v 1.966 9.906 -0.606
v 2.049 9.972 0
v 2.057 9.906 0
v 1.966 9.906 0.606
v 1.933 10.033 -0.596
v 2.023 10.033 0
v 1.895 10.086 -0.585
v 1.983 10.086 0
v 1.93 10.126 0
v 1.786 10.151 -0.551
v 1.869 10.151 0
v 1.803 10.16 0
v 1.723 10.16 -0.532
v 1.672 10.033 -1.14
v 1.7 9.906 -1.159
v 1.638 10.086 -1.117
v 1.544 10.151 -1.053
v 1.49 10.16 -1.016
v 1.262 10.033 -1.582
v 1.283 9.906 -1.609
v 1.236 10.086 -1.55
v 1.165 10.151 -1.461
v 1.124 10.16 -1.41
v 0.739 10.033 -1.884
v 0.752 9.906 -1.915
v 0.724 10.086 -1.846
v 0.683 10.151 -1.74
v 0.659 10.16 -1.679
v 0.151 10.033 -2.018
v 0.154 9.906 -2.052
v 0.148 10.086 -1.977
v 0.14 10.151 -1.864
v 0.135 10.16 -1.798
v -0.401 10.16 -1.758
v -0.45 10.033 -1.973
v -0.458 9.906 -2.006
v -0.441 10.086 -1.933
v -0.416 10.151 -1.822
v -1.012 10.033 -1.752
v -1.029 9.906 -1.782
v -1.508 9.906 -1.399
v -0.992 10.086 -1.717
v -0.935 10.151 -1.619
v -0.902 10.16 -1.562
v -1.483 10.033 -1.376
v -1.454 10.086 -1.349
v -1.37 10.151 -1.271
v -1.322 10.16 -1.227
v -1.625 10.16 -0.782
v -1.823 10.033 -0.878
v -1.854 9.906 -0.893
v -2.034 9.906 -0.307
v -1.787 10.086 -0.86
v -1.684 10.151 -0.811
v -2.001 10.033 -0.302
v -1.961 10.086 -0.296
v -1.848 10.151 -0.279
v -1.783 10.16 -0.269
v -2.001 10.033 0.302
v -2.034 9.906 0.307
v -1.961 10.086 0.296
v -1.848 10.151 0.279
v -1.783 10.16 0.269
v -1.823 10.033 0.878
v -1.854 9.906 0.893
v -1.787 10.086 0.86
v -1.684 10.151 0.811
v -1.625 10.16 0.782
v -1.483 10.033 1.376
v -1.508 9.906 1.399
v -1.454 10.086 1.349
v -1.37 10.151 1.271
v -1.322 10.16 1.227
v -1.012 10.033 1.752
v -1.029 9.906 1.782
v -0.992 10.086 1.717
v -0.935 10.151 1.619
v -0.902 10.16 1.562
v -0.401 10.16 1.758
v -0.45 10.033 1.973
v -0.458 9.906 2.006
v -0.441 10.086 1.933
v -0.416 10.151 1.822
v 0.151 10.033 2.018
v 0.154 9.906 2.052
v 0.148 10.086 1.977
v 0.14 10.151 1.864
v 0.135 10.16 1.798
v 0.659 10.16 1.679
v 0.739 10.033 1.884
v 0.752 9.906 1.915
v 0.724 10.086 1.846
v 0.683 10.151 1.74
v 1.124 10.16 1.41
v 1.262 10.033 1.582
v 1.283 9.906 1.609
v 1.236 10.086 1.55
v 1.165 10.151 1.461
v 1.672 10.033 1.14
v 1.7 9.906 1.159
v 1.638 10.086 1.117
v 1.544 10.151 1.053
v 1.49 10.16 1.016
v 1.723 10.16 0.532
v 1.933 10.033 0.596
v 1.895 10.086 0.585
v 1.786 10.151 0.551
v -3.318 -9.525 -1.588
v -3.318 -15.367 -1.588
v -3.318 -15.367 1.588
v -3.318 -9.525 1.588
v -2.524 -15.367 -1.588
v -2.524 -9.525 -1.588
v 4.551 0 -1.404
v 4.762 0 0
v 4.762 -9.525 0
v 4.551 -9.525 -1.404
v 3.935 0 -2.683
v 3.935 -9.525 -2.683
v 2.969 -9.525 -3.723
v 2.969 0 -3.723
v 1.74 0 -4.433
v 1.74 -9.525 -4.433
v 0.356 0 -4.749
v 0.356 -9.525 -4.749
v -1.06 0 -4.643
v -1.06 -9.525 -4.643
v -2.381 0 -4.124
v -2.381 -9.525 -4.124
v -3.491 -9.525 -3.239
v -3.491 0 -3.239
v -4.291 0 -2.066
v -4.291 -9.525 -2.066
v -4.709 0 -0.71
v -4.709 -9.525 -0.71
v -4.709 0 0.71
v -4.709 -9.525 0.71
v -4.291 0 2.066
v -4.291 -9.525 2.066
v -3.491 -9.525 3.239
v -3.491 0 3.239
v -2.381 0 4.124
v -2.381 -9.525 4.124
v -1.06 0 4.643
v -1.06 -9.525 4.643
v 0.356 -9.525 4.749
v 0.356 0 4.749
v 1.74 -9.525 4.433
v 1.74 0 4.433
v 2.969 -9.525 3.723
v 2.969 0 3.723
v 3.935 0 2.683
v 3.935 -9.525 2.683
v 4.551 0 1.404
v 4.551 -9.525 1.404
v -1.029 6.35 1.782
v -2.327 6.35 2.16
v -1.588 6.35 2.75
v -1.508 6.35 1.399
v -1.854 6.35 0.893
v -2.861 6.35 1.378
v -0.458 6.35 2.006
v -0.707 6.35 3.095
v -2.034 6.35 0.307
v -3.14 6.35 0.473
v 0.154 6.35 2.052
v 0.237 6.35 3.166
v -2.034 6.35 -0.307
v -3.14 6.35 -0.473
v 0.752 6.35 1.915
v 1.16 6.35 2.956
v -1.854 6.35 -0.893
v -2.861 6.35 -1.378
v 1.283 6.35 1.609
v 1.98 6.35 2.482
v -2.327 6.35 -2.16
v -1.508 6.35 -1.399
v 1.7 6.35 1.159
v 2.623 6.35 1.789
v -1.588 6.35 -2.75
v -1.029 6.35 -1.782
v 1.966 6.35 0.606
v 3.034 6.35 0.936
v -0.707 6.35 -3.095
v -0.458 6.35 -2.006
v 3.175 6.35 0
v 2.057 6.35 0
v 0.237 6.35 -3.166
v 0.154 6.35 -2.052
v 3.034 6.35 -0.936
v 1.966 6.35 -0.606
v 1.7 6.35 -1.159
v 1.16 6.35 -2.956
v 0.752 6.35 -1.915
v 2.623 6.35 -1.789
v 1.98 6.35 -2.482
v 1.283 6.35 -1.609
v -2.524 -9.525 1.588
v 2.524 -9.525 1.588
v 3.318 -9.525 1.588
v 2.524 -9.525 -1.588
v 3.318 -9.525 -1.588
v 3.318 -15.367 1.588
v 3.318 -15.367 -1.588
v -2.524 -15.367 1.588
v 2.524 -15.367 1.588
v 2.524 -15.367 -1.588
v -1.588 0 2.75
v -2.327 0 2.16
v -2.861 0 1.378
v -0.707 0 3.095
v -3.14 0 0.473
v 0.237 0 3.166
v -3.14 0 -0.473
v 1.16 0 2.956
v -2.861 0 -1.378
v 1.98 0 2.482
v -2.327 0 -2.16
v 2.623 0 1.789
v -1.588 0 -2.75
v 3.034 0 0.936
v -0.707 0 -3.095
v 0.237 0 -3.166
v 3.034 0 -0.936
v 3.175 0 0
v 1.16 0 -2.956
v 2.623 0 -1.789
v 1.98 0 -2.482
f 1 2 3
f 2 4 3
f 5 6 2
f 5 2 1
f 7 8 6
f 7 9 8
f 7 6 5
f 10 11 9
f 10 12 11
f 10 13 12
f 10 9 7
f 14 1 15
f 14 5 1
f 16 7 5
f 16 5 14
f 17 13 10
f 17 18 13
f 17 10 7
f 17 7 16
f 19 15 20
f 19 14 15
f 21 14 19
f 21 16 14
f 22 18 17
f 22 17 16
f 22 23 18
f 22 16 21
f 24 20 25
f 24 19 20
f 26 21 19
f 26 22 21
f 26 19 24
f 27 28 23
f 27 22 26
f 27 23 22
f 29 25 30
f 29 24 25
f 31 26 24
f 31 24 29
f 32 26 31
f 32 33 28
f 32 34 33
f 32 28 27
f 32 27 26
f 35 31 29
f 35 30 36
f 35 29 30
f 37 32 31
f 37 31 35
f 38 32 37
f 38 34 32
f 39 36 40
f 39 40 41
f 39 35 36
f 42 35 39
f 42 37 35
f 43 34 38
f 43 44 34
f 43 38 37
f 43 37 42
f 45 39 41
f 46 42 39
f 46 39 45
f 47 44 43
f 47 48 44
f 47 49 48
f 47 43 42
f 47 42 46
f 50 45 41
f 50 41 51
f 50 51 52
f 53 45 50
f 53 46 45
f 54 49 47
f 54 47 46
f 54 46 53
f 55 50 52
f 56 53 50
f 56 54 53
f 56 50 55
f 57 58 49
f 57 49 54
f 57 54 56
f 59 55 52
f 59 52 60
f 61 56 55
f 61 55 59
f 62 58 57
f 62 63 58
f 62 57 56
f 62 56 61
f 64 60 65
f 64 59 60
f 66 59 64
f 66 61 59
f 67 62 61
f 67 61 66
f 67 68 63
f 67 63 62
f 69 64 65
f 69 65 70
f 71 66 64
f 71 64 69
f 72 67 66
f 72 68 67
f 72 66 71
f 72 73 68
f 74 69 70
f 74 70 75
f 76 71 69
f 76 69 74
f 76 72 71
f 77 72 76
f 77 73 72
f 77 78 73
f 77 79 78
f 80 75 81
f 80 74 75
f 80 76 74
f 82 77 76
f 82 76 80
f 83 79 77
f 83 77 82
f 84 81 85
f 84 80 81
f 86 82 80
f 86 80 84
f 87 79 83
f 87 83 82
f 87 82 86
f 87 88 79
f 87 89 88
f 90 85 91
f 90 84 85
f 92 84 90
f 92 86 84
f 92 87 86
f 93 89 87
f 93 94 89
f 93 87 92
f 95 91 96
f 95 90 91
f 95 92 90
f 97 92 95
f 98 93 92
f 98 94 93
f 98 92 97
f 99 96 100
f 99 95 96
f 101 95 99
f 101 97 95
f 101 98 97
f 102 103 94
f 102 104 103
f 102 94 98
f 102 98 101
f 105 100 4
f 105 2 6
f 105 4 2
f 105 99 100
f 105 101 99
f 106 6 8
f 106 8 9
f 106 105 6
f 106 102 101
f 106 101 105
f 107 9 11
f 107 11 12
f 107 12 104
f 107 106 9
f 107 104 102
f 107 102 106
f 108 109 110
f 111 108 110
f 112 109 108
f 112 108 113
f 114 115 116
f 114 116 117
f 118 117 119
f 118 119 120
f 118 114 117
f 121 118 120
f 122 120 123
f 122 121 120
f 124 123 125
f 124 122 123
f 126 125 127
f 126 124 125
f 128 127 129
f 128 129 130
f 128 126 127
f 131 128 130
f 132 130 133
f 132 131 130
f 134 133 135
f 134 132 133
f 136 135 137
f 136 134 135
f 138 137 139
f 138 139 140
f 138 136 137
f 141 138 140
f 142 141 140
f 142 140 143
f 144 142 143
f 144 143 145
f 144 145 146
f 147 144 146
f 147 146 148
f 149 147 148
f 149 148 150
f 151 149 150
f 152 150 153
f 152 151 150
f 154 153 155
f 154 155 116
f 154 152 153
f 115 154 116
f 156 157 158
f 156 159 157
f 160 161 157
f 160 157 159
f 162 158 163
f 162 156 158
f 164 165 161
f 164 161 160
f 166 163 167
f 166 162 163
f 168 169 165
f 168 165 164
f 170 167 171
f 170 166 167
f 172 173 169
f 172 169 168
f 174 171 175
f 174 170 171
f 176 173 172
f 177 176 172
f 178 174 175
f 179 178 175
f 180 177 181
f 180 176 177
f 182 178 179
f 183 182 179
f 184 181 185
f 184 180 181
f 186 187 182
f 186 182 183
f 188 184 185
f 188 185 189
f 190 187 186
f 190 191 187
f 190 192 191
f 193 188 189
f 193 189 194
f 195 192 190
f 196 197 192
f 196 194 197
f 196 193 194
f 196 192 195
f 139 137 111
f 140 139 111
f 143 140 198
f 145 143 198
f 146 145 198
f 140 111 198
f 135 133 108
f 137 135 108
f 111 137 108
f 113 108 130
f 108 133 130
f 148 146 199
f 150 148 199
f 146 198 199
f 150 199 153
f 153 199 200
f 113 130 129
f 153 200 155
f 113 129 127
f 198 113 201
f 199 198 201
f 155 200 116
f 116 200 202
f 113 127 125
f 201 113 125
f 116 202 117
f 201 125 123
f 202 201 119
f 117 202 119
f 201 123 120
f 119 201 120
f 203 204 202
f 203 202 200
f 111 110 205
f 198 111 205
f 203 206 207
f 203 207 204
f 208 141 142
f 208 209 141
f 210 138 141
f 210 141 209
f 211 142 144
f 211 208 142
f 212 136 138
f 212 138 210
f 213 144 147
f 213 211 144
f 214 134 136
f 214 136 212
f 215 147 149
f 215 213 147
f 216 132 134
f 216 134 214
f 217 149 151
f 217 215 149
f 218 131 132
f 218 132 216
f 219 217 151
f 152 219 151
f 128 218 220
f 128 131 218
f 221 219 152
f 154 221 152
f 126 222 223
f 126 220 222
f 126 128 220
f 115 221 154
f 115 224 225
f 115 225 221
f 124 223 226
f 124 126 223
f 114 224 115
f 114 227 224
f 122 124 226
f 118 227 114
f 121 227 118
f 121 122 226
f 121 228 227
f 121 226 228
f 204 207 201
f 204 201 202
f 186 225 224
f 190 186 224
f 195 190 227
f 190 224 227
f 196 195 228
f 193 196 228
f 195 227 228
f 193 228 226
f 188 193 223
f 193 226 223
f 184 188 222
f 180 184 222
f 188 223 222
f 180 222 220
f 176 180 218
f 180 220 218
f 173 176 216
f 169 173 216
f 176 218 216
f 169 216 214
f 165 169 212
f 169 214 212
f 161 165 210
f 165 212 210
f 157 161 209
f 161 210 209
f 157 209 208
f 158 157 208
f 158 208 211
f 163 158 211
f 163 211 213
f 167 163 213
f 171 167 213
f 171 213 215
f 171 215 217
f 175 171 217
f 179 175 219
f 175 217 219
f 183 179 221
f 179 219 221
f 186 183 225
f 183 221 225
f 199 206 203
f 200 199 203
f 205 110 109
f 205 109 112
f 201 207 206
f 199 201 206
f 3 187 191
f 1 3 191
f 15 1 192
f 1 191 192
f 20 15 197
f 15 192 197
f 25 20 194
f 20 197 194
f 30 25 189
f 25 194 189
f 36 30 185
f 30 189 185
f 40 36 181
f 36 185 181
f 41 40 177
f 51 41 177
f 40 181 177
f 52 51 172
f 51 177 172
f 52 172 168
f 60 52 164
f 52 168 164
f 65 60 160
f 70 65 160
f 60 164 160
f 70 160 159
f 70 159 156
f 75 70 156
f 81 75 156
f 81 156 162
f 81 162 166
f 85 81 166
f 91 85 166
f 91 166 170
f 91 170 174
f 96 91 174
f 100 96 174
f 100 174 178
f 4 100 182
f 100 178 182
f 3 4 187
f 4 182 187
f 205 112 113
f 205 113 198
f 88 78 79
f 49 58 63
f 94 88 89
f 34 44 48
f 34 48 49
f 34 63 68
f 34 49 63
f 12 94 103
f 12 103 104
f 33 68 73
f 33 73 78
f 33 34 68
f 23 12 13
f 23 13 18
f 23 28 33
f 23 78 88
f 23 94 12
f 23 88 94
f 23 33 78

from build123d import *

# Parameters (mm, degrees)
SKETCH1_R           = 4.7625
BOSS_EXTRUDE1_DEPTH = 9.525
SKETCH2_R           = 3.175
BOSS_EXTRUDE2_DEPTH = 6.35
SKETCH3_R           = 2.0574
BOSS_EXTRUDE3_DEPTH = 3.81
SKETCH4_W           = 0.79375
SKETCH4_H           = 3.175
BOSS_EXTRUDE4_DEPTH = 5.842
FILLET1_R           = 0.254


with BuildPart() as part:
    # Sketch1 → Boss-Extrude1 (new body)
    with BuildSketch(Plane(origin=(0, 0, 0), x_dir=(1, 0, 0), z_dir=(0, 1, 0))):
        Circle(SKETCH1_R)
    extrude(amount=-BOSS_EXTRUDE1_DEPTH)

    # Sketch2 → Boss-Extrude2 (add)
    with BuildSketch(Plane(origin=(0, 0, 0), x_dir=(1, 0, 0), z_dir=(0, 1, 0))):
        Circle(SKETCH2_R)
    extrude(amount=BOSS_EXTRUDE2_DEPTH)

    # Sketch3 → Boss-Extrude3 (add)
    with BuildSketch(Plane(origin=(0, 6.35, 0), x_dir=(1, 0, 0), z_dir=(0, 1, 0))):
        Circle(SKETCH3_R)
    extrude(amount=BOSS_EXTRUDE3_DEPTH)

    # Sketch4 → Boss-Extrude4 (add)
    with BuildSketch(Plane.XZ.offset(9.525)):
        with Locations((2.921, 0)):
            Rectangle(SKETCH4_W, SKETCH4_H)
        with Locations((-2.921, 0)):
            Rectangle(SKETCH4_W, SKETCH4_H)
    extrude(amount=BOSS_EXTRUDE4_DEPTH)

    # Fillet1
    fillet1_edges = [part.edges().sort_by_distance(p)[0] for p in [
        (-2.0574, 10.16, 0),
    ]]
    fillet(fillet1_edges, radius=FILLET1_R)


solid = part.part
